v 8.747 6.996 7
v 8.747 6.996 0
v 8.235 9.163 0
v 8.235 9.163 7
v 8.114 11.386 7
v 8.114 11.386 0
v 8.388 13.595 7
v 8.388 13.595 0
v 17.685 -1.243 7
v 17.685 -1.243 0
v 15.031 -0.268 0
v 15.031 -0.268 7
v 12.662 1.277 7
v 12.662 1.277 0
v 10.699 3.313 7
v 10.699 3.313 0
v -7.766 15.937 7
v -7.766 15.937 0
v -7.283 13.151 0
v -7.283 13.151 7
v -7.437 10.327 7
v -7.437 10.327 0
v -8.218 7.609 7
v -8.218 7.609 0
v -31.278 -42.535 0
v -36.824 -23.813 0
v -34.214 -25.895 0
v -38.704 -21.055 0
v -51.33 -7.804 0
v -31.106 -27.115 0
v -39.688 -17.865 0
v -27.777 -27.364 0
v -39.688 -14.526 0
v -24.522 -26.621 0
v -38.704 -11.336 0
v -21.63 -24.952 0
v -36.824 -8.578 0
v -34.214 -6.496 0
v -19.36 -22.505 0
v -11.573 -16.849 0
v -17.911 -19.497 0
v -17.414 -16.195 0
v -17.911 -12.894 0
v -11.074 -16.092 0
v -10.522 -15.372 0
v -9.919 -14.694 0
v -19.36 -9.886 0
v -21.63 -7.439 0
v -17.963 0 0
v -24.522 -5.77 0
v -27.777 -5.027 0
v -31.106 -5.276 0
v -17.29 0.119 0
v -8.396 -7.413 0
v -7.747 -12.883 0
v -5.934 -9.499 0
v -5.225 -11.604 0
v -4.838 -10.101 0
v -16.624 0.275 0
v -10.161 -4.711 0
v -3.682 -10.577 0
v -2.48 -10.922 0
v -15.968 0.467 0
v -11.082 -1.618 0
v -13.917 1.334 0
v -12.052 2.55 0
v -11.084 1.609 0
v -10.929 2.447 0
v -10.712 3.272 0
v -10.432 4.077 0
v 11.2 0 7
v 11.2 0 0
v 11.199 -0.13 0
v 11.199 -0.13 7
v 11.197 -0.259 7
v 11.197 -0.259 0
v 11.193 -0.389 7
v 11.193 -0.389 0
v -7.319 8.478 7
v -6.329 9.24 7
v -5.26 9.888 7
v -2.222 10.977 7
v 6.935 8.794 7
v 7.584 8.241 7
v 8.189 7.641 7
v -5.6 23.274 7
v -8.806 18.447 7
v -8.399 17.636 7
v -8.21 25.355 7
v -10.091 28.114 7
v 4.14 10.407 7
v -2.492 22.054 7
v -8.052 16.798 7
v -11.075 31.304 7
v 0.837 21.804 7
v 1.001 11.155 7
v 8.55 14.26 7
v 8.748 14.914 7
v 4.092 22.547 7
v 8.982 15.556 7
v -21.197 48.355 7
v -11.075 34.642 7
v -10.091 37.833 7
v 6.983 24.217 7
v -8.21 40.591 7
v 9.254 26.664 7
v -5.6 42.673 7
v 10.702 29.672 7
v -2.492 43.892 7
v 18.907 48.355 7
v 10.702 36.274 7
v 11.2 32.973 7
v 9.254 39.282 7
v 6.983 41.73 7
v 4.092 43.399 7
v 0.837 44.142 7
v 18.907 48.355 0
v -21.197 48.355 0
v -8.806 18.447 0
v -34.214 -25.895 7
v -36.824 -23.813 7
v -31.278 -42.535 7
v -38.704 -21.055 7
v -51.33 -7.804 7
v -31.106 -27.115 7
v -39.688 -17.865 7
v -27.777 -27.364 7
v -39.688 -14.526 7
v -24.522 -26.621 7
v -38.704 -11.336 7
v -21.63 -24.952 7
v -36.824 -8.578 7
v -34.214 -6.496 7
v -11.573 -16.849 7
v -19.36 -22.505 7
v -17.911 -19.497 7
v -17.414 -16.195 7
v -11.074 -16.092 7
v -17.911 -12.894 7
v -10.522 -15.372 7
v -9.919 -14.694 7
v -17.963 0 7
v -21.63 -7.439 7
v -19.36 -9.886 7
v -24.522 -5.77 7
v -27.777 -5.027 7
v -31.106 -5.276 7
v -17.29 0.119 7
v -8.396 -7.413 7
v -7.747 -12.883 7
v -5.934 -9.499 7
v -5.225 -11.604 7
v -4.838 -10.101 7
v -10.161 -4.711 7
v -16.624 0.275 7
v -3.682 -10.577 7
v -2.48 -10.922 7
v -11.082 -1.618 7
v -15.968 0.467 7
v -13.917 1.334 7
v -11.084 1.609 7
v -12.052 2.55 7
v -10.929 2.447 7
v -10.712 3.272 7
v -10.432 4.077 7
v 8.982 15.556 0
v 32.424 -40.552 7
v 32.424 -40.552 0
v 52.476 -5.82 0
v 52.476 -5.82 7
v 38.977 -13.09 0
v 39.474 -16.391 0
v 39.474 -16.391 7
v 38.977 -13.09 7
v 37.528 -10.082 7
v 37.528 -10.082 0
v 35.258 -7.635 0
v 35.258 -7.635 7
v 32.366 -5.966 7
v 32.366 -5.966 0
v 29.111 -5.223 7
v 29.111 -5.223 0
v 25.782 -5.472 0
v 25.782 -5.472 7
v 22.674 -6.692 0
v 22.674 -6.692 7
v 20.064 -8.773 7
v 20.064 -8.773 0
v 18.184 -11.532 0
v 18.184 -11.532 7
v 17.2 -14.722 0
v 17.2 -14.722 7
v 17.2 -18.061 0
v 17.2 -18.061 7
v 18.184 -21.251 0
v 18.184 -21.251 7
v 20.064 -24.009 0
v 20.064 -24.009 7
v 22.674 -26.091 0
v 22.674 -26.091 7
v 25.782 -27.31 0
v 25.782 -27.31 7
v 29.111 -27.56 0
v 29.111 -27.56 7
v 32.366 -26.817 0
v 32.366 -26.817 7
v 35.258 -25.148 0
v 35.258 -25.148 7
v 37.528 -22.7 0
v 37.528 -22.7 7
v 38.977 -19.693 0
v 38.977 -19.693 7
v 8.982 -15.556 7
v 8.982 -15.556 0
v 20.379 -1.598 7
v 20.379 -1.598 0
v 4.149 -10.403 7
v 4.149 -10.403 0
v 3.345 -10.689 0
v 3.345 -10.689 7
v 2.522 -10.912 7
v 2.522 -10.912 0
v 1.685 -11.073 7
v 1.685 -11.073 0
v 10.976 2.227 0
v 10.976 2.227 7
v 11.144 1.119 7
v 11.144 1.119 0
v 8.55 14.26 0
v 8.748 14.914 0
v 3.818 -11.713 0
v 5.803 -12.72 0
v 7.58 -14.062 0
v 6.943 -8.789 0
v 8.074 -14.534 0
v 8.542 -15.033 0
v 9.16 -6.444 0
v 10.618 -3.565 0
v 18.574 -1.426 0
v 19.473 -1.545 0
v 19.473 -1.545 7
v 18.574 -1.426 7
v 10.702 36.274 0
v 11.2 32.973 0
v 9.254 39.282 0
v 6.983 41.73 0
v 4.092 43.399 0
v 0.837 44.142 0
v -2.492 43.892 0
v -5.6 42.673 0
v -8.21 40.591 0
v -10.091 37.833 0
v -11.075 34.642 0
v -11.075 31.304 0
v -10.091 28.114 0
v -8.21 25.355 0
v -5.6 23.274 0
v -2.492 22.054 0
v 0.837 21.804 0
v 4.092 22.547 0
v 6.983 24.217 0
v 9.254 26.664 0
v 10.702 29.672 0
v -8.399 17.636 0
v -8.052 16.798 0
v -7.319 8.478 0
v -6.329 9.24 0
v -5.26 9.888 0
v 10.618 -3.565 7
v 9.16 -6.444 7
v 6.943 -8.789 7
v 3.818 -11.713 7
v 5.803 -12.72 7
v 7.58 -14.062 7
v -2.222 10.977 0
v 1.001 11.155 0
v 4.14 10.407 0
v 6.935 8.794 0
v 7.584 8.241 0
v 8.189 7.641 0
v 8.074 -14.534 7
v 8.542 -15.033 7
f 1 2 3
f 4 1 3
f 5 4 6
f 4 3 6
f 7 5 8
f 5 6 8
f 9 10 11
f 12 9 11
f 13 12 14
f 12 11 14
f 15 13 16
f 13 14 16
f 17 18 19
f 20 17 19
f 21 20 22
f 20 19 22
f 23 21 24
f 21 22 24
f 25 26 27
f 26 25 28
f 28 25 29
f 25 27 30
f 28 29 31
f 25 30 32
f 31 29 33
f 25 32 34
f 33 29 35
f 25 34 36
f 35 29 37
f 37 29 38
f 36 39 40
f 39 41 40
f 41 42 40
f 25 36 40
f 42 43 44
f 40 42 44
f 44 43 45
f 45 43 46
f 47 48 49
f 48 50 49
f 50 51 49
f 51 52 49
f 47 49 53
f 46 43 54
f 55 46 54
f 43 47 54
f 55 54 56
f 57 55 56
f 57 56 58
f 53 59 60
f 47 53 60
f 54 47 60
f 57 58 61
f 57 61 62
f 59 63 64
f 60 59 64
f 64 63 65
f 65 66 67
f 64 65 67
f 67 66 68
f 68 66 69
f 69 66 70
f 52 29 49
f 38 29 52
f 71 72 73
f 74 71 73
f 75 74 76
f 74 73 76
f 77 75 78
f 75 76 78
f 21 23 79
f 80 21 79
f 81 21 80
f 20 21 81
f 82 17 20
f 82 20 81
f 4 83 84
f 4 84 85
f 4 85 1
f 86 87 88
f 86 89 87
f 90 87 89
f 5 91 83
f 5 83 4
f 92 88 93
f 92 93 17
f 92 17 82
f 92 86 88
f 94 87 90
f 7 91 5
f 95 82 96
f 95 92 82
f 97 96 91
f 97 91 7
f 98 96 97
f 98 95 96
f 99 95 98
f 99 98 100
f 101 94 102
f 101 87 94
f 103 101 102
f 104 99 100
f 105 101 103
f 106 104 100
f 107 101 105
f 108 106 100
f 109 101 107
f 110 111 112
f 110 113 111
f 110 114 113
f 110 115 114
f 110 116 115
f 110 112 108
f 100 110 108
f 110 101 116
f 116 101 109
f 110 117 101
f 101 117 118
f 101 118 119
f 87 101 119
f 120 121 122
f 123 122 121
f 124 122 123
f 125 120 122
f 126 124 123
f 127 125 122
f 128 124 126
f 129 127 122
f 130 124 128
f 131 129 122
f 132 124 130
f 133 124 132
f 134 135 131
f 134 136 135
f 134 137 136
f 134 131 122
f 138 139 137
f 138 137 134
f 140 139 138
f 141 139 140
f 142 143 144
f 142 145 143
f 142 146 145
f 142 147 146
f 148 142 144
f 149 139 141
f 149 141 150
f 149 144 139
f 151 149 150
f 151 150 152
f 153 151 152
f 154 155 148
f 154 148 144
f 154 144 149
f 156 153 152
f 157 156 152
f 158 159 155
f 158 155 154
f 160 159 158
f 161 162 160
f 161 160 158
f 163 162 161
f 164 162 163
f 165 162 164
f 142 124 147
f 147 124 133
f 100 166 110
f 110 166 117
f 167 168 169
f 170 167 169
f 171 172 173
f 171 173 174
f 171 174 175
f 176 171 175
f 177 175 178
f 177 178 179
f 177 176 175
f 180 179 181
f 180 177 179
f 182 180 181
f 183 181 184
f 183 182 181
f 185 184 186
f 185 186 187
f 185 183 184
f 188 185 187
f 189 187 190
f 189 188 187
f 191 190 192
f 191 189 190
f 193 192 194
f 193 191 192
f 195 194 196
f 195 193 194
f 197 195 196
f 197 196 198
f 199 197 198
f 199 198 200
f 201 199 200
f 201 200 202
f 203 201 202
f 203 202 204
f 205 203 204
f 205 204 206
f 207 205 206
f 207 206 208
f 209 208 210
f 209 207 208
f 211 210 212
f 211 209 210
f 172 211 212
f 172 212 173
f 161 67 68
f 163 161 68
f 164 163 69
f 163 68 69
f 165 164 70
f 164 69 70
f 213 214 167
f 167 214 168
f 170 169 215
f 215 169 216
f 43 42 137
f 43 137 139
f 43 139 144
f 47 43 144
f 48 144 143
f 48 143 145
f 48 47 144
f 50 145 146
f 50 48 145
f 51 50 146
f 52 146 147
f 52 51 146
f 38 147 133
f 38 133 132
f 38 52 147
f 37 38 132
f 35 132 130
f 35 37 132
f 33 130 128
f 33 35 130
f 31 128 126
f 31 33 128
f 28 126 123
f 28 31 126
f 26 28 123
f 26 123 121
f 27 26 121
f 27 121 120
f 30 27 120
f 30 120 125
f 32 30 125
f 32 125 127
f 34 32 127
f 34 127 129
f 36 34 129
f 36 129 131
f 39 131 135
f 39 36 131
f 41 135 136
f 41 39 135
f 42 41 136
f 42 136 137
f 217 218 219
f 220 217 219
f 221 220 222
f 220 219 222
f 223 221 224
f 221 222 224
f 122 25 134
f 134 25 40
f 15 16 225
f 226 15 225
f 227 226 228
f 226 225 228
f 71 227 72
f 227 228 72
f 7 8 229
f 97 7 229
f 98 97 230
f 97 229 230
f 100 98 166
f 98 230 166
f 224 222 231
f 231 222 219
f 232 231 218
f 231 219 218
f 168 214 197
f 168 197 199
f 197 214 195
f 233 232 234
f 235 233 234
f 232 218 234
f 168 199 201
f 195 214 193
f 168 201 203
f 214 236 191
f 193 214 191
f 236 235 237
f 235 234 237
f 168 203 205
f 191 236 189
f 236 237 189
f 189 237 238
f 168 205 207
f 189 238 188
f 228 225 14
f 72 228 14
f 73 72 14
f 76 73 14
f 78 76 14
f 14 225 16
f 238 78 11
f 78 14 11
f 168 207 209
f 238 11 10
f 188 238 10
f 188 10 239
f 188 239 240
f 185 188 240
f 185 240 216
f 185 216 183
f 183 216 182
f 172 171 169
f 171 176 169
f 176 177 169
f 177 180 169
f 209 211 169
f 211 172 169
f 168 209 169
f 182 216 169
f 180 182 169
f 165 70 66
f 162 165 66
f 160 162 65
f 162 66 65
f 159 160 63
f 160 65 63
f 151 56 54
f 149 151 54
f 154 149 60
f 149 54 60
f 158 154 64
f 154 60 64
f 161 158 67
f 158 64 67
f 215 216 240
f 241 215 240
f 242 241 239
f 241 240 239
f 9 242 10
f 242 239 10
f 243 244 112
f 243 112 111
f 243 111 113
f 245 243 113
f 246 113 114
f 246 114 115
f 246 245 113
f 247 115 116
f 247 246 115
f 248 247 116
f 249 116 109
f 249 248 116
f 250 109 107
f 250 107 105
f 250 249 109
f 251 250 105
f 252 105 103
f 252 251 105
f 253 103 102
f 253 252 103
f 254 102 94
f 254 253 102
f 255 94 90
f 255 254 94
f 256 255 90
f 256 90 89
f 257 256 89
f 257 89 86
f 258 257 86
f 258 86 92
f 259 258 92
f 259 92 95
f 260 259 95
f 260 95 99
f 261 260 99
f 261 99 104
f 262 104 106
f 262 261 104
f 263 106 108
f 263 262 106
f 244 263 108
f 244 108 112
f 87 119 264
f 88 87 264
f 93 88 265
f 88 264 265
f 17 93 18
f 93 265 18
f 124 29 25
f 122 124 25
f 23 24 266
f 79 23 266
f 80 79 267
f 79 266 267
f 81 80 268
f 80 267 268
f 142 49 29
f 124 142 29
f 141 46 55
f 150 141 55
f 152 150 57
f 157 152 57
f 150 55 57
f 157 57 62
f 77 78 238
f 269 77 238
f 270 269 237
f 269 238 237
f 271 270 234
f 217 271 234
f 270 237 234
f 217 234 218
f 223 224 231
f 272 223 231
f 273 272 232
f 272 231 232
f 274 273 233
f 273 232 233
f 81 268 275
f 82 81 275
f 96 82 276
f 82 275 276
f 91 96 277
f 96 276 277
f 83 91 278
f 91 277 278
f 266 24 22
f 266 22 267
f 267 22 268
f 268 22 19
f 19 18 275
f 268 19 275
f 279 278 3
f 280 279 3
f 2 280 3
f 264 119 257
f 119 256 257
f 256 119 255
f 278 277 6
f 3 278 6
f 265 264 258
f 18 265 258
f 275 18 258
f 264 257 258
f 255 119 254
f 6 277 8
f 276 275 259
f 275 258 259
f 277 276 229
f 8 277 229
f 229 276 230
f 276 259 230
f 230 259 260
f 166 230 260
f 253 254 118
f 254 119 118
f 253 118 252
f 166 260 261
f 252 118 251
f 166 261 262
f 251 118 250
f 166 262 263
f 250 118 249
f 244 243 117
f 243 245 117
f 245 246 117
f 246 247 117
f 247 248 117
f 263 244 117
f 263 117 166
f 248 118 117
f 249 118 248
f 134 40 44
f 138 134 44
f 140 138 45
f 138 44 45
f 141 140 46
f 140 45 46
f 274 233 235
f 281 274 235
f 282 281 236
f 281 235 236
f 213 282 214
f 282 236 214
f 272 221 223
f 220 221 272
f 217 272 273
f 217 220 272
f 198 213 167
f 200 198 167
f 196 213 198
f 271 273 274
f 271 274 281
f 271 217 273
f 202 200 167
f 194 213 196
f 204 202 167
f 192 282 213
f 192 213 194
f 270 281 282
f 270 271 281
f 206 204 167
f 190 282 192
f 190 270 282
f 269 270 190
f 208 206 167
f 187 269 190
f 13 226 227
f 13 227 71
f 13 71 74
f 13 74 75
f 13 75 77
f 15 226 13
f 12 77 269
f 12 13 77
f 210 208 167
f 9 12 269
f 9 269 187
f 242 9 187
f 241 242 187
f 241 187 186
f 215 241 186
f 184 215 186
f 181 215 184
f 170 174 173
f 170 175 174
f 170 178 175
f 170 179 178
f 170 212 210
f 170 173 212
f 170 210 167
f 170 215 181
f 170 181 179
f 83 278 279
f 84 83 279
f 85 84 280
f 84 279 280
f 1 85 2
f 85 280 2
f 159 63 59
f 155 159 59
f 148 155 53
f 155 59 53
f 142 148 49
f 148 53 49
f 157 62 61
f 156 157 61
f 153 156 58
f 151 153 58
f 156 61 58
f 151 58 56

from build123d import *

# Parameters (mm, degrees)
F0_R     = 11.2
F1_DEPTH = 7


with BuildPart() as f1:
    # F0 (on Top) → F1 (new body)
    with BuildSketch(Plane.XY):
        with BuildLine():
            ThreePointArc((-5.2595837188, 9.8882141514), (1.0005355797, 11.1552197896), (6.9352702674, 8.7944315517))
            Line((6.9352702674, 8.7944315517), (8.3880803337, 13.5953459421))
            ThreePointArc((8.3880803337, 13.5953459421), (8.6447320558, 14.5880479762), (8.9815450309, 15.556492324))
            Line((8.9815450309, 15.556492324), (18.9068615437, 48.3554080129))
            Line((18.9068615437, 48.3554080129), (-21.1970992386, 48.3554080129))
            Line((-21.1970992386, 48.3554080129), (-8.8056664665, 18.4471298955))
            ThreePointArc((-8.8056664665, 18.4471298955), (-8.2176746167, 17.2204918982), (-7.7658625488, 15.937432645))
            Line((-7.7658625488, 15.937432645), (-5.2595837188, 9.8882141514))
        make_face()
        with Locations((0, 32.9730696976)):
            Circle(F0_R, mode=Mode.SUBTRACT)
        with BuildLine():
            ThreePointArc((-8.2184282818, 7.6090365078), (-6.8346810134, 8.8728313094), (-5.2595837188, 9.8882141514))
            Line((-5.2595837188, 9.8882141514), (-7.7658625488, 15.937432645))
            ThreePointArc((-7.7658625488, 15.937432645), (-7.2802142561, 11.7345481785), (-8.2184282818, 7.6090365078))
        make_face()
        with BuildLine():
            Line((8.3880803337, 13.5953459421), (6.9352702674, 8.7944315517))
            ThreePointArc((6.9352702674, 8.7944315517), (7.8923023589, 7.9467957993), (8.7465031872, 6.9956187715))
            ThreePointArc((8.7465031872, 6.9956187715), (8.1251282899, 10.2714690168), (8.3880803337, 13.5953459421))
        make_face()
    extrude(amount=F1_DEPTH)


with BuildPart() as f1b:
    # F0 (on Top) → F1, piece 2 (new body)
    with BuildSketch(Plane.XY):
        with BuildLine():
            ThreePointArc((-5.9336527938, -9.4990401895), (-10.1609715124, -4.7111206654), (-11.0838362693, 1.6089044579))
            Line((-11.0838362693, 1.6089044579), (-15.967955126, 0.4666176869))
            ThreePointArc((-15.967955126, 0.4666176869), (-16.9559861669, 0.1925335812), (-17.9630900618, 0))
            Line((-17.9630900618, 0), (-51.3304425213, -7.8038816038))
            Line((-51.3304425213, -7.8038816038), (-31.2784621302, -42.5349304336))
            Line((-31.2784621302, -42.5349304336), (-11.5728498832, -16.849495805))
            ThreePointArc((-11.5728498832, -16.849495805), (-10.8045461412, -15.7269609272), (-9.9192902673, -14.694150572))
            Line((-9.9192902673, -14.694150572), (-5.9336527938, -9.4990401895))
        make_face()
        with Locations((-28.6135822535, -16.1954835057)):
            Circle(F0_R, mode=Mode.SUBTRACT)
        with BuildLine():
            ThreePointArc((-11.0838362693, 1.6089044579), (-10.8282782203, 2.8615364376), (-10.4316351649, 4.0768845686))
            ThreePointArc((-10.4316351649, 4.0768845686), (-12.9579172477, 1.9008329997), (-15.967955126, 0.4666176869))
            Line((-15.967955126, 0.4666176869), (-11.0838362693, 1.6089044579))
        make_face()
        with BuildLine():
            ThreePointArc((-2.4804047732, -10.9218859251), (-4.2667568108, -10.3554230391), (-5.9336527938, -9.4990401895))
            Line((-5.9336527938, -9.4990401895), (-9.9192902673, -14.694150572))
            ThreePointArc((-9.9192902673, -14.694150572), (-6.5223096965, -12.1721245801), (-2.4804047732, -10.9218859251))
        make_face()
    extrude(amount=F1_DEPTH)


with BuildPart() as f1c:
    # F0 (on Top) → F1, piece 3 (new body)
    with BuildSketch(Plane.XY):
        with BuildLine():
            ThreePointArc((20.3785163497, -1.5976340905), (19.0222207578, -1.493530971), (17.685152816, -1.2432820729))
            Line((17.685152816, -1.2432820729), (11.1932365126, -0.3891739619))
            ThreePointArc((11.1932365126, -0.3891739619), (9.1604359327, -6.4440991242), (4.1485660019, -10.4033360096))
            Line((4.1485660019, -10.4033360096), (7.5798747923, -14.061963629))
            ThreePointArc((7.5798747923, -14.061963629), (8.3112541111, -14.7805815574), (8.9815450309, -15.556492324))
            Line((8.9815450309, -15.556492324), (32.4235809777, -40.5515264091))
            Line((32.4235809777, -40.5515264091), (52.4755613688, -5.8204775792))
            Line((52.4755613688, -5.8204775792), (20.3785163497, -1.5976340905))
        make_face()
        with Locations((28.2744250147, -16.3912960288)):
            Circle(F0_R, mode=Mode.SUBTRACT)
        with BuildLine():
            ThreePointArc((17.685152816, -1.2432820729), (13.8025239526, 0.4375764016), (10.698833055, 3.3128494173))
            ThreePointArc((10.698833055, 3.3128494173), (11.0739995082, 1.6752715876), (11.2, 0))
            ThreePointArc((11.2, 0), (11.1983090005, -0.1946163645), (11.1932365126, -0.3891739619))
            Line((11.1932365126, -0.3891739619), (17.685152816, -1.2432820729))
        make_face()
        with BuildLine():
            Line((7.5798747923, -14.061963629), (4.1485660019, -10.4033360096))
            ThreePointArc((4.1485660019, -10.4033360096), (2.9359758614, -10.8083322368), (1.6851319778, -11.0725033401))
            ThreePointArc((1.6851319778, -11.0725033401), (4.8327889577, -12.1723020165), (7.5798747923, -14.061963629))
        make_face()
    extrude(amount=F1_DEPTH)


solid = Compound([f1.part, f1b.part, f1c.part])
